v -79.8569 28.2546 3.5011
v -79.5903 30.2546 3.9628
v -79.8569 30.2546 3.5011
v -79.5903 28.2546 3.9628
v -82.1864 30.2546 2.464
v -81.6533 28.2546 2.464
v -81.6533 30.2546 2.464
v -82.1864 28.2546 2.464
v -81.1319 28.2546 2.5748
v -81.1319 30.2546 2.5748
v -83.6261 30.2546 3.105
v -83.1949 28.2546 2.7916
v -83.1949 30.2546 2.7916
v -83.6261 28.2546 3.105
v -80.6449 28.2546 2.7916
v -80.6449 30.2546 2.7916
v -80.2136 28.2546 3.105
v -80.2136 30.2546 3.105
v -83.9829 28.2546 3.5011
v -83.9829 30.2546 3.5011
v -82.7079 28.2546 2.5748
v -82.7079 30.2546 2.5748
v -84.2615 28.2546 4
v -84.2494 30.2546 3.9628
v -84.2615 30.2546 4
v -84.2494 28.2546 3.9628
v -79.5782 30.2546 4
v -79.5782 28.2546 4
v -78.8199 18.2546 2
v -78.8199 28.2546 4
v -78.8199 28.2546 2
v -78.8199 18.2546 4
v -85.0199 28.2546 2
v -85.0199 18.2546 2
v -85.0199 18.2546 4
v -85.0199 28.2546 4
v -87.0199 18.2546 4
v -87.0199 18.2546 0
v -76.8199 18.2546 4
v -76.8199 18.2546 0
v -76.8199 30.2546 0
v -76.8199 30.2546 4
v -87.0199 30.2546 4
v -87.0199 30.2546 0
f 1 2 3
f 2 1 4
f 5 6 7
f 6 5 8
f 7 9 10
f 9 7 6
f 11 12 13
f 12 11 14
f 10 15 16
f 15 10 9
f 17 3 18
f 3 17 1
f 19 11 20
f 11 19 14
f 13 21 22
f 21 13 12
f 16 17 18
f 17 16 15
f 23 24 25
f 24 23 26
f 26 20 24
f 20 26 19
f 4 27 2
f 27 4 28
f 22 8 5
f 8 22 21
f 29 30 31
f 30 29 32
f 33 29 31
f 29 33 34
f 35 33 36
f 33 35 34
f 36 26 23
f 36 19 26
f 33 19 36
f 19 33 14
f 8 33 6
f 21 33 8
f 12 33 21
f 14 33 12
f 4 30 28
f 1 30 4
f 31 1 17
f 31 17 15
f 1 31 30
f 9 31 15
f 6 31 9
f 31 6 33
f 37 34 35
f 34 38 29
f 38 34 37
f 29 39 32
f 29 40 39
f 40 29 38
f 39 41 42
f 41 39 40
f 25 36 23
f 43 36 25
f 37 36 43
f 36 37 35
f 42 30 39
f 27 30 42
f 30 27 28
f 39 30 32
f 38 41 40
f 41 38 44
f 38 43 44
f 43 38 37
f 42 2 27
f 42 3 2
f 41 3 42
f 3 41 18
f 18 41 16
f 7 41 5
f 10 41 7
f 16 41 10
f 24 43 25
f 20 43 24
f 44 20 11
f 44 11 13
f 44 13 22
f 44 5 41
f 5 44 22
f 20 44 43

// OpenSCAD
difference () {
  union () {
    translate ([-81.9198659461757, 24.254647206382906, 2]) {
      cube ([10.2, 12, 4], center=true);
    }
  }
  union () {
    translate ([-81.9198659461757, 30.254647206382906, 5]) {
      rotate (a=90.0, v=[1, 0, 0]) {
        cylinder ($fn=30, h=20, r=2.55, center=true);
      }
    }
    translate ([-81.9198659461757, 23.254647206382906, 5]) {
      cube ([6.2, 10, 6], center=true);
    }
  }
}
